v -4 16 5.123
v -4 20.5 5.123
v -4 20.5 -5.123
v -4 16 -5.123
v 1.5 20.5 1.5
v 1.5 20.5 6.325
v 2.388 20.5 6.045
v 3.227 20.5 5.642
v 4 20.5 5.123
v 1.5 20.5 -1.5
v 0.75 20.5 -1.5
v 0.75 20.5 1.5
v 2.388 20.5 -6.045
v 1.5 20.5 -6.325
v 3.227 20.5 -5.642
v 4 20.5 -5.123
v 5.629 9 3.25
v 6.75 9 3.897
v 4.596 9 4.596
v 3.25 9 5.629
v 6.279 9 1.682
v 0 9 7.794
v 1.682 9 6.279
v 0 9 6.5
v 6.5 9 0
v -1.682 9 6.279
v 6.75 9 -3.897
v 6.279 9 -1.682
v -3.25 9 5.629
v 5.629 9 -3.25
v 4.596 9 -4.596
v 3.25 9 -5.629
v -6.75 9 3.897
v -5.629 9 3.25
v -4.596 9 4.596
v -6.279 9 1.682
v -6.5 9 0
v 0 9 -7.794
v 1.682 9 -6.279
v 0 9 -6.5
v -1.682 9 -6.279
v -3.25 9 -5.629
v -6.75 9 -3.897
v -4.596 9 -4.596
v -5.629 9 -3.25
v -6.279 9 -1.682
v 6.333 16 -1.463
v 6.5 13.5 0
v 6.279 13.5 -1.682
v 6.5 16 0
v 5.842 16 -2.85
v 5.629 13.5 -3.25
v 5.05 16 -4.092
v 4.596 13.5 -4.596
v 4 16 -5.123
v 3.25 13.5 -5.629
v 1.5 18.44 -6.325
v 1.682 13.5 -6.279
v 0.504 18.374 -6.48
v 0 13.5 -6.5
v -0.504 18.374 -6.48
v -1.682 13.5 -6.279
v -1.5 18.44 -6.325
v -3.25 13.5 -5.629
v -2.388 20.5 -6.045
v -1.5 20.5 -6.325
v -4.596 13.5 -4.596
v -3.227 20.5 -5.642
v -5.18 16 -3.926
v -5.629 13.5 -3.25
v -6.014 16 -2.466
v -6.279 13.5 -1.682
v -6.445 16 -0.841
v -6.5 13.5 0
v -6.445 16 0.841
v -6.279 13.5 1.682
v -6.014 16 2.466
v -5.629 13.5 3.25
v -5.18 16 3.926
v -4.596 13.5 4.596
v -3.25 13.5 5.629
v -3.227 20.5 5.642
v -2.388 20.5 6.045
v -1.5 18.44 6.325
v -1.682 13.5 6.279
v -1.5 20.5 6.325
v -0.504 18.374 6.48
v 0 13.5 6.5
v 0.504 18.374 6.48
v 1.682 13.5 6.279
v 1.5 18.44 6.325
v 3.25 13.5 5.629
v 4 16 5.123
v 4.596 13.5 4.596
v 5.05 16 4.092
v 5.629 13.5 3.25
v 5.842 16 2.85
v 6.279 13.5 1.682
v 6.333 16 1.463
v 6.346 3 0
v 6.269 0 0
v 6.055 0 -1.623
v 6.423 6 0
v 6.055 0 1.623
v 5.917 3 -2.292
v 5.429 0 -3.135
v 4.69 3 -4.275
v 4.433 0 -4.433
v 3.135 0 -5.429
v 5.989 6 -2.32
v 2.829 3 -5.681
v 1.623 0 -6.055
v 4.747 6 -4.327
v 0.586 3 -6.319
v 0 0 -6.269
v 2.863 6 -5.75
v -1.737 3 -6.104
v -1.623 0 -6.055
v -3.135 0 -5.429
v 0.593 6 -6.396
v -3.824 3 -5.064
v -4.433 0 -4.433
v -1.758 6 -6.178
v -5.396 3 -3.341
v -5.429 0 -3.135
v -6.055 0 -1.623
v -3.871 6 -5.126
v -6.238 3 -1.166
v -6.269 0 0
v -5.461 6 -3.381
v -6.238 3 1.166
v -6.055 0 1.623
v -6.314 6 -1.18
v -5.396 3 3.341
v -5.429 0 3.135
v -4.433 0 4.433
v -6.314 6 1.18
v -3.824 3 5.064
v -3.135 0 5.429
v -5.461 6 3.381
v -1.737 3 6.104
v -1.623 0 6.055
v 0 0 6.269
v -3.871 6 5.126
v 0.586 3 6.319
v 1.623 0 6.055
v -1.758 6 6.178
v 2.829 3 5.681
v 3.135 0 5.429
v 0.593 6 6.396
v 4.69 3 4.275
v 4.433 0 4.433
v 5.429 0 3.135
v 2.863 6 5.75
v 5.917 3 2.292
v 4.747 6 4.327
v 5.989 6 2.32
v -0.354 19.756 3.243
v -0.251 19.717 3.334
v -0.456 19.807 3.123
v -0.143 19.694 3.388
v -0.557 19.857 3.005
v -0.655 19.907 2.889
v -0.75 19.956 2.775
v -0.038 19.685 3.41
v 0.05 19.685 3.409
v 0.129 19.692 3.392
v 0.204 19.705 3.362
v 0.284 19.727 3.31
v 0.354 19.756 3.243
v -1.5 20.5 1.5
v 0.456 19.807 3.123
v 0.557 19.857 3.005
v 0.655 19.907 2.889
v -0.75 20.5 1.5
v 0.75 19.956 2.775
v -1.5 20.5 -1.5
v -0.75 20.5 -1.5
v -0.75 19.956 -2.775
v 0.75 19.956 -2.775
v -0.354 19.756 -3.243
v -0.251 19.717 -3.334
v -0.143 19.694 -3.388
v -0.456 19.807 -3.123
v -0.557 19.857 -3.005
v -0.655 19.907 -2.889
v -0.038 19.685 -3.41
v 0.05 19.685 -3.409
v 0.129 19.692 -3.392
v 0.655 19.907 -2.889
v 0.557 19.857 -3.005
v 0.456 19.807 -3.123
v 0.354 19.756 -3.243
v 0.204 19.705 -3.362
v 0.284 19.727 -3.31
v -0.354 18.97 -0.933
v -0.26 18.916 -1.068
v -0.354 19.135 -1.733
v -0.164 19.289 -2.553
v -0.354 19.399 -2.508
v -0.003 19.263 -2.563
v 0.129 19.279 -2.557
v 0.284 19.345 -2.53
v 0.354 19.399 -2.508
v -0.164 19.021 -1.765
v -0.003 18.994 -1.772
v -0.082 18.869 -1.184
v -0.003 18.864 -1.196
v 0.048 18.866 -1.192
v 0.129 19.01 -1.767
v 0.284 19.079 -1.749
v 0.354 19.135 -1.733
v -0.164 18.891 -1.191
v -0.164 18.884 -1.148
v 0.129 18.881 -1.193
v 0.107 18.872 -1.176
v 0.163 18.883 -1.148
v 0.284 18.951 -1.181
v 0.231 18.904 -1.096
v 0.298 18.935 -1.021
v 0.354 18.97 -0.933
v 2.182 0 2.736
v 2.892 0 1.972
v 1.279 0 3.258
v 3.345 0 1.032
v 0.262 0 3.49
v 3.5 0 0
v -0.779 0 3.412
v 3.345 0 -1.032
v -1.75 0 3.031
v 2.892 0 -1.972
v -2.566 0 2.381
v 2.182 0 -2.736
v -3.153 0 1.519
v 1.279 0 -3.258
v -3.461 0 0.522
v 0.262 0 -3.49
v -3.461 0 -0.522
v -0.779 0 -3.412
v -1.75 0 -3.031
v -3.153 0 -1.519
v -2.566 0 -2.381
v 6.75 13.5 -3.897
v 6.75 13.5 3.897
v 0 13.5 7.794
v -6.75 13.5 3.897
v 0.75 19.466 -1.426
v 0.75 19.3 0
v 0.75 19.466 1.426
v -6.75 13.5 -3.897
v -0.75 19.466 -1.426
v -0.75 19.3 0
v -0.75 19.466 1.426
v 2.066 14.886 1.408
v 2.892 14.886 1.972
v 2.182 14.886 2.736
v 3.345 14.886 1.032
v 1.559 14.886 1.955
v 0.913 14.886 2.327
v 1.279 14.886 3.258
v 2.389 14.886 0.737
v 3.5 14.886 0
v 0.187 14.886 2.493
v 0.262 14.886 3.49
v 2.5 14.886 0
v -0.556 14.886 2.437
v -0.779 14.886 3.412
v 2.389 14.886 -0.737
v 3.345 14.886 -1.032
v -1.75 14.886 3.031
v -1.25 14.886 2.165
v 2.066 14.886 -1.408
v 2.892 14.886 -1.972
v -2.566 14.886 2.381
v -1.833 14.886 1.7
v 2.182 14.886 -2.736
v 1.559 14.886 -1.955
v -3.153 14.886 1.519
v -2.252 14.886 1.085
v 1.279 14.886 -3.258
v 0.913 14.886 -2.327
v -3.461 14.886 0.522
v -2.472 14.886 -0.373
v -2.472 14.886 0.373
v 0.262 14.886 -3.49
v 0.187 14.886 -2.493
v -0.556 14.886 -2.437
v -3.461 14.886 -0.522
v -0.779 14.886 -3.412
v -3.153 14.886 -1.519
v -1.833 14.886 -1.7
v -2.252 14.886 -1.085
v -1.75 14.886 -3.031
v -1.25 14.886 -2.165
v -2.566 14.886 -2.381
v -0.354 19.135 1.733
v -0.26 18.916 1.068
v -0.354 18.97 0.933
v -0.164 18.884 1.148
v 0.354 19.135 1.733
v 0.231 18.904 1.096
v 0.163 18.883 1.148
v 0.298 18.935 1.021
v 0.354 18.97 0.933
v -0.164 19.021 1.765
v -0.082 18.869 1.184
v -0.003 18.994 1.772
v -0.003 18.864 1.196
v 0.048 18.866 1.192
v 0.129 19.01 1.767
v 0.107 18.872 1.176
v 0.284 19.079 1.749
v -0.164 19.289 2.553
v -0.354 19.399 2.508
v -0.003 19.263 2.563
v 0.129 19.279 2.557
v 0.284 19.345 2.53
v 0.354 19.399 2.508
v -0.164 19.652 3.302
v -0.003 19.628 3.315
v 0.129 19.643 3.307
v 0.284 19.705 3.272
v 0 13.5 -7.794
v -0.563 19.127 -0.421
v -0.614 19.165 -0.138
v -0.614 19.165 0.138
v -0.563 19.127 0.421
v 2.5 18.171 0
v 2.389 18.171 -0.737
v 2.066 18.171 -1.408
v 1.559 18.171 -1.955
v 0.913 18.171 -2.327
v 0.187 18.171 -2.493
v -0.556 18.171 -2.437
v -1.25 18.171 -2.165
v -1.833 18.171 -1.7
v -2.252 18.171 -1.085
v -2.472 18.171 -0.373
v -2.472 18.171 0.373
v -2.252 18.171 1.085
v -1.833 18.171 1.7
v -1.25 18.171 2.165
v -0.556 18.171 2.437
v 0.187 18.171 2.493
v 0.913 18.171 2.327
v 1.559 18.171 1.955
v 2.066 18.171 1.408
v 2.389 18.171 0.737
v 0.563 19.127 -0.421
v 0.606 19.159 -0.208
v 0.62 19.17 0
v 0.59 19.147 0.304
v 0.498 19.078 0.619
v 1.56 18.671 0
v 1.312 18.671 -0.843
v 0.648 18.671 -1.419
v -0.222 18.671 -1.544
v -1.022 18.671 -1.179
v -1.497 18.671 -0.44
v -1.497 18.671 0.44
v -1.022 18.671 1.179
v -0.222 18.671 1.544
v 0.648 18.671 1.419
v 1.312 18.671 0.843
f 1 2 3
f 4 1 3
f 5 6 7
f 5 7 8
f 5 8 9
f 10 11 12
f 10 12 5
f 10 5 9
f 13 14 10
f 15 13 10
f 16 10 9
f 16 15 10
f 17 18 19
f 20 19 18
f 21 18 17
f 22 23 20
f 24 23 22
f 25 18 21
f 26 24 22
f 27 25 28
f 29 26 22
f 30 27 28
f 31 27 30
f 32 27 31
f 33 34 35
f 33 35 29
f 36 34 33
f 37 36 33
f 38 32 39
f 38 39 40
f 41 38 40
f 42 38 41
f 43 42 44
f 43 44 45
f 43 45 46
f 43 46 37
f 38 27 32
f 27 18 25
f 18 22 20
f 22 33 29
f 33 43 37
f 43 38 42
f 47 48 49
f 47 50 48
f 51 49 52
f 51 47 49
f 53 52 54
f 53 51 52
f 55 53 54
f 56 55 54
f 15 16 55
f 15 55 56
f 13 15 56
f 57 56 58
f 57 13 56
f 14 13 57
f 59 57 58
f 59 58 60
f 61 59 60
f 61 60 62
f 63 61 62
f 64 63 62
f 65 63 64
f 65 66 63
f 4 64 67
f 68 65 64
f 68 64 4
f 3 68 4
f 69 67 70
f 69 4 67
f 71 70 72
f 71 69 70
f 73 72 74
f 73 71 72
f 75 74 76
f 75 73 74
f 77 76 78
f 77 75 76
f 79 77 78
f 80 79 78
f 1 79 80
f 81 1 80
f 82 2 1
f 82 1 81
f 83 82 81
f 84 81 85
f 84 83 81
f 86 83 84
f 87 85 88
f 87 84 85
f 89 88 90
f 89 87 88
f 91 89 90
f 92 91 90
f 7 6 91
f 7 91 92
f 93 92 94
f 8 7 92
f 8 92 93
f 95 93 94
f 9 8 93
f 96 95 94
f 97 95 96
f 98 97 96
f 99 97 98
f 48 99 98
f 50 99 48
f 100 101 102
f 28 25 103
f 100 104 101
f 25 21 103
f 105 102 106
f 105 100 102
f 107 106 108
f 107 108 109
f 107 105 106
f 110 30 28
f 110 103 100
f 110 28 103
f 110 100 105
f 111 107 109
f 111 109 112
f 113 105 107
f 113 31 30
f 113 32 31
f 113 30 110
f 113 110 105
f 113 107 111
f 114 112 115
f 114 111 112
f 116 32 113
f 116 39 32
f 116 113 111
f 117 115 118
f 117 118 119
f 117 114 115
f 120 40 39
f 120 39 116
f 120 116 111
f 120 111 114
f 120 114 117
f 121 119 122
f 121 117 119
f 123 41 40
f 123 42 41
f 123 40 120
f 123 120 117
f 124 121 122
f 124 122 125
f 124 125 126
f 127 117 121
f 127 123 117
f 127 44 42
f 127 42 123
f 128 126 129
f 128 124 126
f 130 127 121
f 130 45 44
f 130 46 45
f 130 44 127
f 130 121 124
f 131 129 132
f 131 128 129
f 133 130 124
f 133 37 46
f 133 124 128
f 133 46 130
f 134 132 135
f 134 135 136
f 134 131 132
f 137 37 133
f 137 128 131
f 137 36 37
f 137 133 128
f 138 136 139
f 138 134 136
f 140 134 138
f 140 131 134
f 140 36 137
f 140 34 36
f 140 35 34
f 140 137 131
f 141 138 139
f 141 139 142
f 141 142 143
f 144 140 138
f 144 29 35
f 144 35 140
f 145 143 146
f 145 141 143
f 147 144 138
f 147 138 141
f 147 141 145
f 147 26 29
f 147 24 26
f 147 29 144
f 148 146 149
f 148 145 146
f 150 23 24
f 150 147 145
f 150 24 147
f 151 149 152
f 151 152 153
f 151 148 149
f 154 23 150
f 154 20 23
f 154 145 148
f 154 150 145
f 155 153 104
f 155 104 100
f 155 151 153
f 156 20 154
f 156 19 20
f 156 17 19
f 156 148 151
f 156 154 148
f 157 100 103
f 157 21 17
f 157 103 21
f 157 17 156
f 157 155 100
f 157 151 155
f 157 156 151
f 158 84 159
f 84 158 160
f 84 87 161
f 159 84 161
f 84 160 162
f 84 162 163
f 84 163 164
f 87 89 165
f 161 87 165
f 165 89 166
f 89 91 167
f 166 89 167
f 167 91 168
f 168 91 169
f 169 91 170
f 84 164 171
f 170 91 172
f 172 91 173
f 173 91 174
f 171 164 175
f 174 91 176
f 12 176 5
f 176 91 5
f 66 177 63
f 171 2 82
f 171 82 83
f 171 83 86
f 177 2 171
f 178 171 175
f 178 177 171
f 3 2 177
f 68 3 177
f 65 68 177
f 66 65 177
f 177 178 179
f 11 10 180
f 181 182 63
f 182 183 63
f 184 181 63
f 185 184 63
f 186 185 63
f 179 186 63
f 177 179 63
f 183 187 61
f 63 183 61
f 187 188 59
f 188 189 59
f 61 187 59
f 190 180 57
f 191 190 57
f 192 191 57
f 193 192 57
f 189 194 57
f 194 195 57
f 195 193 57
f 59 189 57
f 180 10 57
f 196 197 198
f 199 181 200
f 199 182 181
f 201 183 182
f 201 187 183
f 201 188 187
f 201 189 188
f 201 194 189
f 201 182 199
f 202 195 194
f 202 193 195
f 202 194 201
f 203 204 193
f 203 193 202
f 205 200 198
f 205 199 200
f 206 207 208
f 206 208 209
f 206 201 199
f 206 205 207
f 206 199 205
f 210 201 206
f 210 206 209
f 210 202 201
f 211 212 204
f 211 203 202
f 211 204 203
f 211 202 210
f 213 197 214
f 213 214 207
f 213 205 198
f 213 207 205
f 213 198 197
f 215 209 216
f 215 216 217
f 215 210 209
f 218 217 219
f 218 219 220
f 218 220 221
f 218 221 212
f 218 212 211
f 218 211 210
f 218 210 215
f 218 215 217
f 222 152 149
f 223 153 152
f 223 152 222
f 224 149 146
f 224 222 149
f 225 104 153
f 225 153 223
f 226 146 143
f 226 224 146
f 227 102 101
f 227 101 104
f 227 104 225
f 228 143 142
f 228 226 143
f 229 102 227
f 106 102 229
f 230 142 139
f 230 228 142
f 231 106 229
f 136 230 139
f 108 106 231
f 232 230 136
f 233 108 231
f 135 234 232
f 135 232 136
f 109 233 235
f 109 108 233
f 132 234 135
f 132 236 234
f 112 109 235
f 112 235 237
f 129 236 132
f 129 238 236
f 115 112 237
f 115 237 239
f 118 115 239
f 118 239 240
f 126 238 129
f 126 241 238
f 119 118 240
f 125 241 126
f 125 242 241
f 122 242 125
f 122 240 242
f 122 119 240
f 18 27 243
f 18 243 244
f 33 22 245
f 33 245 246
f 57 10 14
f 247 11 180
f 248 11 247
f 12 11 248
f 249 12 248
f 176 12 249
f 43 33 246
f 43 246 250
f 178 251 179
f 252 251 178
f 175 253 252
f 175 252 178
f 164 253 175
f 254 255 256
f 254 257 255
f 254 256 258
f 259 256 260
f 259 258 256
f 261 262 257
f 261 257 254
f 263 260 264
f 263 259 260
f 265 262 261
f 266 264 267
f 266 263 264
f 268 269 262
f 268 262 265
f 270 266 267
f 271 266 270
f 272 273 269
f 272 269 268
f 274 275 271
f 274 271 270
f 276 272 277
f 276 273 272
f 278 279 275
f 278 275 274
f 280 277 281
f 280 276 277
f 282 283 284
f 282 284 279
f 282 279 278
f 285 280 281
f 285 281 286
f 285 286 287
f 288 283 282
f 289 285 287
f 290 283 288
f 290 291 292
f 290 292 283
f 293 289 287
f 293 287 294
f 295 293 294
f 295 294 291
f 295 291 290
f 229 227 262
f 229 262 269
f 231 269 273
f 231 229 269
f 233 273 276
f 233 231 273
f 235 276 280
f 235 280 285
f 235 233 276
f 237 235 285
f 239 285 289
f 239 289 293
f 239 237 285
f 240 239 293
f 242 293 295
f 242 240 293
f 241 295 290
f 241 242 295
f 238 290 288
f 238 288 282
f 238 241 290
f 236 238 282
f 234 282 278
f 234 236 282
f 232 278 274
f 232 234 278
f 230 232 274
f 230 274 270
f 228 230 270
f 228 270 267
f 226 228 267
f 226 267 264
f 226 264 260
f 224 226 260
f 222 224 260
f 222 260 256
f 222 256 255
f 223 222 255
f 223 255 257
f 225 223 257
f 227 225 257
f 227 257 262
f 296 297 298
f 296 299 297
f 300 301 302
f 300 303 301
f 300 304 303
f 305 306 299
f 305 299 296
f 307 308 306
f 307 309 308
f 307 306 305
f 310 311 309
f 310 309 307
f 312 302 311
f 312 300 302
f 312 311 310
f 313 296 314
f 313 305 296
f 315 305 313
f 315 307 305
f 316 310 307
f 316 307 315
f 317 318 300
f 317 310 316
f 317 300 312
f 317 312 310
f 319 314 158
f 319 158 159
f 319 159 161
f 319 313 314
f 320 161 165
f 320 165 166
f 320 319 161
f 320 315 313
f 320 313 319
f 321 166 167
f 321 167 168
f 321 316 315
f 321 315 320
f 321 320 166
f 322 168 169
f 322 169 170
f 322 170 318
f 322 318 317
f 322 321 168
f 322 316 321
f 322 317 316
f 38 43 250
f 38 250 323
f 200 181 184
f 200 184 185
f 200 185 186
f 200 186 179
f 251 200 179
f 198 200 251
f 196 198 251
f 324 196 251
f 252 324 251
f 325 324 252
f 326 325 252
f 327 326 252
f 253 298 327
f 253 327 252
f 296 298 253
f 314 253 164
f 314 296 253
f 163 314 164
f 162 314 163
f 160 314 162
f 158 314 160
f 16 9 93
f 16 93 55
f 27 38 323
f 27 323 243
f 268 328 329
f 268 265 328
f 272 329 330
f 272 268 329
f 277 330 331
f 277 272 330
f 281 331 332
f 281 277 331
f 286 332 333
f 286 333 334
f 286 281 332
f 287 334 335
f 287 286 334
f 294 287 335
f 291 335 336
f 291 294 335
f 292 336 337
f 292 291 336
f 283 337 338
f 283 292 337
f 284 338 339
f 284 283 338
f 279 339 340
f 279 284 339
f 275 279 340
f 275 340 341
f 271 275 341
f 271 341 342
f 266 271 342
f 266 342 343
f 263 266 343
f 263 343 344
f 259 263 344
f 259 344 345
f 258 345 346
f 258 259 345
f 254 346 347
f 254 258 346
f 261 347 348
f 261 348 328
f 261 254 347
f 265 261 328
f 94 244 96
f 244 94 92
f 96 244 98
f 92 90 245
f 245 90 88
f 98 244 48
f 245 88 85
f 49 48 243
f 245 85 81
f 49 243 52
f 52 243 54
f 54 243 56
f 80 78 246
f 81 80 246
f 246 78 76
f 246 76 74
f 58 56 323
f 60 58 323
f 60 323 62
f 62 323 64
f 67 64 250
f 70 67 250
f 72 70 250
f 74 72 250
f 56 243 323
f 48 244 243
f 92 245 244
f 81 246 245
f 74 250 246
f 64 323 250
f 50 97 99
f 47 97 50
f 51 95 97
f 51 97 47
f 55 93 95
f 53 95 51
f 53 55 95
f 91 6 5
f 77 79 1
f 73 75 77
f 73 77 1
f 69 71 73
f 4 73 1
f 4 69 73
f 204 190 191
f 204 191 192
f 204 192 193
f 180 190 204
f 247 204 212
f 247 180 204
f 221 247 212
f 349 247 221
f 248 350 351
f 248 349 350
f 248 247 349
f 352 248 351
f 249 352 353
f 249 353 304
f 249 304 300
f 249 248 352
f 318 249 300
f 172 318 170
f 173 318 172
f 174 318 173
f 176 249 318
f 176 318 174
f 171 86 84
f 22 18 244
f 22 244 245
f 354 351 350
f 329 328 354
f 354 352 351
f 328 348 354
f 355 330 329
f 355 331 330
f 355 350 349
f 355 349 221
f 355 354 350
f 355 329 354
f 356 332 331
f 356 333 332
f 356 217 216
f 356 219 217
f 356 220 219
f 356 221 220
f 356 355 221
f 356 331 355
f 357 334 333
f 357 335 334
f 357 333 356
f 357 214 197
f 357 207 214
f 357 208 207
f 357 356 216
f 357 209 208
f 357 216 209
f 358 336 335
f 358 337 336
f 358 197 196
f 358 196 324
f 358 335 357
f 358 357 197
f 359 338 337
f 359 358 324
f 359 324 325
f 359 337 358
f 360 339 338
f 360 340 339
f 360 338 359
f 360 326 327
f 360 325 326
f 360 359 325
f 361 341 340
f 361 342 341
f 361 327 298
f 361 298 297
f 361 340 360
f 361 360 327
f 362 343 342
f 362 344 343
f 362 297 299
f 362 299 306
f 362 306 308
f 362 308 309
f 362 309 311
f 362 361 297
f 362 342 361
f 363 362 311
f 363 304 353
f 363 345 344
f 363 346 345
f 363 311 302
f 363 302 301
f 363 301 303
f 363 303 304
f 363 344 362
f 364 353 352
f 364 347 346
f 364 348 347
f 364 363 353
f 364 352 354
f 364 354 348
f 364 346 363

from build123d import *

# Parameters (mm, degrees)
SKETCH2_R           = 3.5
BOSS_EXTRUDE1_DEPTH = 4.5
SKETCH3_OUTSIDE_W   = 21.316
SKETCH3_OUTSIDE_H   = 23.404
SKETCH3_OUTSIDE_W_2 = 8
SKETCH3_OUTSIDE_H_2 = 19.758973988
CUT_EXTRUDE1_DEPTH  = 4.5
CUT_EXTRUDE2_DEPTH  = 1.5


with BuildPart() as part:
    # Sketch1 → Revolve1 (revolve)
    with BuildSketch(Plane.XY, mode=Mode.PRIVATE) as revolve1_sk:
        Polygon((-3.5, 0), (-6.269042262, 0), (-6.5, 9), (-6.5, 20.5), (0, 20.5), (0, 19.5), (-2.5, 18.170968217), (-2.5, 14.885545964), (-3.5, 14.885545964), align=None)
    revolve(revolve1_sk.sketch.rotate(Axis((0, 0, 0), (0, 1, 0)), 180), axis=Axis((0, 0, 0), (0, 1, 0)))

    # Sketch2 → Boss-Extrude1 (add)
    with BuildSketch(Plane(origin=(0, 9, 0), x_dir=(-1, 0, 0), z_dir=(0, -1, 0))):
        Polygon((0, 7.794228634), (-6.75, 3.897114317), (-6.75, -3.897114317), (0, -7.794228634), (6.75, -3.897114317), (6.75, 3.897114317), align=None)
        with Locations(Location((0, 0, 0), (0, 0, 180))):
            Circle(SKETCH2_R, mode=Mode.SUBTRACT)
    extrude(amount=-BOSS_EXTRUDE1_DEPTH)

    # Sketch3 outside → Cut-Extrude1 (cut)
    with BuildSketch(Plane(origin=(0, 20.5, 0), x_dir=(1, 0, 0), z_dir=(0, 1, 0))):
        Rectangle(SKETCH3_OUTSIDE_W, SKETCH3_OUTSIDE_H)
        Rectangle(SKETCH3_OUTSIDE_W_2, SKETCH3_OUTSIDE_H_2, mode=Mode.SUBTRACT)
    extrude(amount=-CUT_EXTRUDE1_DEPTH, mode=Mode.SUBTRACT)

    # Sketch4 → Cut-Extrude2 (cut, symmetric)
    with BuildSketch(Plane(origin=(0, 0, 0), x_dir=(0, 0, -1), z_dir=(1, 0, 0))):
        Polygon((-1.5, 20.5), (1.5, 20.5), (6.937499451, 18.178686883), (6.937499451, 21.048014109), (-6.937499451, 21.048014109), (-6.937499451, 18.178686883), align=None)
    extrude(amount=CUT_EXTRUDE2_DEPTH, both=True, mode=Mode.SUBTRACT)

    # Sketch8 → Cut-Revolve2 (revolve, cut)
    with BuildSketch(Plane.XY):
        with BuildLine():
            Line((-0.75, 19.3), (-0.353553391, 18.903553391))
            ThreePointArc((-0.353553391, 18.903553391), (0, 18.757106781), (0.353553391, 18.903553391))
            Line((0.353553391, 18.903553391), (0.75, 19.3))
            Line((0.75, 19.3), (0.75, 25.5))
            Line((0.75, 25.5), (-0.75, 25.5))
            Line((-0.75, 25.5), (-0.75, 19.3))
        make_face()
    revolve(axis=Axis((0, 25.5, 0), (-1, 0, 0)), mode=Mode.SUBTRACT)


solid = part.part
